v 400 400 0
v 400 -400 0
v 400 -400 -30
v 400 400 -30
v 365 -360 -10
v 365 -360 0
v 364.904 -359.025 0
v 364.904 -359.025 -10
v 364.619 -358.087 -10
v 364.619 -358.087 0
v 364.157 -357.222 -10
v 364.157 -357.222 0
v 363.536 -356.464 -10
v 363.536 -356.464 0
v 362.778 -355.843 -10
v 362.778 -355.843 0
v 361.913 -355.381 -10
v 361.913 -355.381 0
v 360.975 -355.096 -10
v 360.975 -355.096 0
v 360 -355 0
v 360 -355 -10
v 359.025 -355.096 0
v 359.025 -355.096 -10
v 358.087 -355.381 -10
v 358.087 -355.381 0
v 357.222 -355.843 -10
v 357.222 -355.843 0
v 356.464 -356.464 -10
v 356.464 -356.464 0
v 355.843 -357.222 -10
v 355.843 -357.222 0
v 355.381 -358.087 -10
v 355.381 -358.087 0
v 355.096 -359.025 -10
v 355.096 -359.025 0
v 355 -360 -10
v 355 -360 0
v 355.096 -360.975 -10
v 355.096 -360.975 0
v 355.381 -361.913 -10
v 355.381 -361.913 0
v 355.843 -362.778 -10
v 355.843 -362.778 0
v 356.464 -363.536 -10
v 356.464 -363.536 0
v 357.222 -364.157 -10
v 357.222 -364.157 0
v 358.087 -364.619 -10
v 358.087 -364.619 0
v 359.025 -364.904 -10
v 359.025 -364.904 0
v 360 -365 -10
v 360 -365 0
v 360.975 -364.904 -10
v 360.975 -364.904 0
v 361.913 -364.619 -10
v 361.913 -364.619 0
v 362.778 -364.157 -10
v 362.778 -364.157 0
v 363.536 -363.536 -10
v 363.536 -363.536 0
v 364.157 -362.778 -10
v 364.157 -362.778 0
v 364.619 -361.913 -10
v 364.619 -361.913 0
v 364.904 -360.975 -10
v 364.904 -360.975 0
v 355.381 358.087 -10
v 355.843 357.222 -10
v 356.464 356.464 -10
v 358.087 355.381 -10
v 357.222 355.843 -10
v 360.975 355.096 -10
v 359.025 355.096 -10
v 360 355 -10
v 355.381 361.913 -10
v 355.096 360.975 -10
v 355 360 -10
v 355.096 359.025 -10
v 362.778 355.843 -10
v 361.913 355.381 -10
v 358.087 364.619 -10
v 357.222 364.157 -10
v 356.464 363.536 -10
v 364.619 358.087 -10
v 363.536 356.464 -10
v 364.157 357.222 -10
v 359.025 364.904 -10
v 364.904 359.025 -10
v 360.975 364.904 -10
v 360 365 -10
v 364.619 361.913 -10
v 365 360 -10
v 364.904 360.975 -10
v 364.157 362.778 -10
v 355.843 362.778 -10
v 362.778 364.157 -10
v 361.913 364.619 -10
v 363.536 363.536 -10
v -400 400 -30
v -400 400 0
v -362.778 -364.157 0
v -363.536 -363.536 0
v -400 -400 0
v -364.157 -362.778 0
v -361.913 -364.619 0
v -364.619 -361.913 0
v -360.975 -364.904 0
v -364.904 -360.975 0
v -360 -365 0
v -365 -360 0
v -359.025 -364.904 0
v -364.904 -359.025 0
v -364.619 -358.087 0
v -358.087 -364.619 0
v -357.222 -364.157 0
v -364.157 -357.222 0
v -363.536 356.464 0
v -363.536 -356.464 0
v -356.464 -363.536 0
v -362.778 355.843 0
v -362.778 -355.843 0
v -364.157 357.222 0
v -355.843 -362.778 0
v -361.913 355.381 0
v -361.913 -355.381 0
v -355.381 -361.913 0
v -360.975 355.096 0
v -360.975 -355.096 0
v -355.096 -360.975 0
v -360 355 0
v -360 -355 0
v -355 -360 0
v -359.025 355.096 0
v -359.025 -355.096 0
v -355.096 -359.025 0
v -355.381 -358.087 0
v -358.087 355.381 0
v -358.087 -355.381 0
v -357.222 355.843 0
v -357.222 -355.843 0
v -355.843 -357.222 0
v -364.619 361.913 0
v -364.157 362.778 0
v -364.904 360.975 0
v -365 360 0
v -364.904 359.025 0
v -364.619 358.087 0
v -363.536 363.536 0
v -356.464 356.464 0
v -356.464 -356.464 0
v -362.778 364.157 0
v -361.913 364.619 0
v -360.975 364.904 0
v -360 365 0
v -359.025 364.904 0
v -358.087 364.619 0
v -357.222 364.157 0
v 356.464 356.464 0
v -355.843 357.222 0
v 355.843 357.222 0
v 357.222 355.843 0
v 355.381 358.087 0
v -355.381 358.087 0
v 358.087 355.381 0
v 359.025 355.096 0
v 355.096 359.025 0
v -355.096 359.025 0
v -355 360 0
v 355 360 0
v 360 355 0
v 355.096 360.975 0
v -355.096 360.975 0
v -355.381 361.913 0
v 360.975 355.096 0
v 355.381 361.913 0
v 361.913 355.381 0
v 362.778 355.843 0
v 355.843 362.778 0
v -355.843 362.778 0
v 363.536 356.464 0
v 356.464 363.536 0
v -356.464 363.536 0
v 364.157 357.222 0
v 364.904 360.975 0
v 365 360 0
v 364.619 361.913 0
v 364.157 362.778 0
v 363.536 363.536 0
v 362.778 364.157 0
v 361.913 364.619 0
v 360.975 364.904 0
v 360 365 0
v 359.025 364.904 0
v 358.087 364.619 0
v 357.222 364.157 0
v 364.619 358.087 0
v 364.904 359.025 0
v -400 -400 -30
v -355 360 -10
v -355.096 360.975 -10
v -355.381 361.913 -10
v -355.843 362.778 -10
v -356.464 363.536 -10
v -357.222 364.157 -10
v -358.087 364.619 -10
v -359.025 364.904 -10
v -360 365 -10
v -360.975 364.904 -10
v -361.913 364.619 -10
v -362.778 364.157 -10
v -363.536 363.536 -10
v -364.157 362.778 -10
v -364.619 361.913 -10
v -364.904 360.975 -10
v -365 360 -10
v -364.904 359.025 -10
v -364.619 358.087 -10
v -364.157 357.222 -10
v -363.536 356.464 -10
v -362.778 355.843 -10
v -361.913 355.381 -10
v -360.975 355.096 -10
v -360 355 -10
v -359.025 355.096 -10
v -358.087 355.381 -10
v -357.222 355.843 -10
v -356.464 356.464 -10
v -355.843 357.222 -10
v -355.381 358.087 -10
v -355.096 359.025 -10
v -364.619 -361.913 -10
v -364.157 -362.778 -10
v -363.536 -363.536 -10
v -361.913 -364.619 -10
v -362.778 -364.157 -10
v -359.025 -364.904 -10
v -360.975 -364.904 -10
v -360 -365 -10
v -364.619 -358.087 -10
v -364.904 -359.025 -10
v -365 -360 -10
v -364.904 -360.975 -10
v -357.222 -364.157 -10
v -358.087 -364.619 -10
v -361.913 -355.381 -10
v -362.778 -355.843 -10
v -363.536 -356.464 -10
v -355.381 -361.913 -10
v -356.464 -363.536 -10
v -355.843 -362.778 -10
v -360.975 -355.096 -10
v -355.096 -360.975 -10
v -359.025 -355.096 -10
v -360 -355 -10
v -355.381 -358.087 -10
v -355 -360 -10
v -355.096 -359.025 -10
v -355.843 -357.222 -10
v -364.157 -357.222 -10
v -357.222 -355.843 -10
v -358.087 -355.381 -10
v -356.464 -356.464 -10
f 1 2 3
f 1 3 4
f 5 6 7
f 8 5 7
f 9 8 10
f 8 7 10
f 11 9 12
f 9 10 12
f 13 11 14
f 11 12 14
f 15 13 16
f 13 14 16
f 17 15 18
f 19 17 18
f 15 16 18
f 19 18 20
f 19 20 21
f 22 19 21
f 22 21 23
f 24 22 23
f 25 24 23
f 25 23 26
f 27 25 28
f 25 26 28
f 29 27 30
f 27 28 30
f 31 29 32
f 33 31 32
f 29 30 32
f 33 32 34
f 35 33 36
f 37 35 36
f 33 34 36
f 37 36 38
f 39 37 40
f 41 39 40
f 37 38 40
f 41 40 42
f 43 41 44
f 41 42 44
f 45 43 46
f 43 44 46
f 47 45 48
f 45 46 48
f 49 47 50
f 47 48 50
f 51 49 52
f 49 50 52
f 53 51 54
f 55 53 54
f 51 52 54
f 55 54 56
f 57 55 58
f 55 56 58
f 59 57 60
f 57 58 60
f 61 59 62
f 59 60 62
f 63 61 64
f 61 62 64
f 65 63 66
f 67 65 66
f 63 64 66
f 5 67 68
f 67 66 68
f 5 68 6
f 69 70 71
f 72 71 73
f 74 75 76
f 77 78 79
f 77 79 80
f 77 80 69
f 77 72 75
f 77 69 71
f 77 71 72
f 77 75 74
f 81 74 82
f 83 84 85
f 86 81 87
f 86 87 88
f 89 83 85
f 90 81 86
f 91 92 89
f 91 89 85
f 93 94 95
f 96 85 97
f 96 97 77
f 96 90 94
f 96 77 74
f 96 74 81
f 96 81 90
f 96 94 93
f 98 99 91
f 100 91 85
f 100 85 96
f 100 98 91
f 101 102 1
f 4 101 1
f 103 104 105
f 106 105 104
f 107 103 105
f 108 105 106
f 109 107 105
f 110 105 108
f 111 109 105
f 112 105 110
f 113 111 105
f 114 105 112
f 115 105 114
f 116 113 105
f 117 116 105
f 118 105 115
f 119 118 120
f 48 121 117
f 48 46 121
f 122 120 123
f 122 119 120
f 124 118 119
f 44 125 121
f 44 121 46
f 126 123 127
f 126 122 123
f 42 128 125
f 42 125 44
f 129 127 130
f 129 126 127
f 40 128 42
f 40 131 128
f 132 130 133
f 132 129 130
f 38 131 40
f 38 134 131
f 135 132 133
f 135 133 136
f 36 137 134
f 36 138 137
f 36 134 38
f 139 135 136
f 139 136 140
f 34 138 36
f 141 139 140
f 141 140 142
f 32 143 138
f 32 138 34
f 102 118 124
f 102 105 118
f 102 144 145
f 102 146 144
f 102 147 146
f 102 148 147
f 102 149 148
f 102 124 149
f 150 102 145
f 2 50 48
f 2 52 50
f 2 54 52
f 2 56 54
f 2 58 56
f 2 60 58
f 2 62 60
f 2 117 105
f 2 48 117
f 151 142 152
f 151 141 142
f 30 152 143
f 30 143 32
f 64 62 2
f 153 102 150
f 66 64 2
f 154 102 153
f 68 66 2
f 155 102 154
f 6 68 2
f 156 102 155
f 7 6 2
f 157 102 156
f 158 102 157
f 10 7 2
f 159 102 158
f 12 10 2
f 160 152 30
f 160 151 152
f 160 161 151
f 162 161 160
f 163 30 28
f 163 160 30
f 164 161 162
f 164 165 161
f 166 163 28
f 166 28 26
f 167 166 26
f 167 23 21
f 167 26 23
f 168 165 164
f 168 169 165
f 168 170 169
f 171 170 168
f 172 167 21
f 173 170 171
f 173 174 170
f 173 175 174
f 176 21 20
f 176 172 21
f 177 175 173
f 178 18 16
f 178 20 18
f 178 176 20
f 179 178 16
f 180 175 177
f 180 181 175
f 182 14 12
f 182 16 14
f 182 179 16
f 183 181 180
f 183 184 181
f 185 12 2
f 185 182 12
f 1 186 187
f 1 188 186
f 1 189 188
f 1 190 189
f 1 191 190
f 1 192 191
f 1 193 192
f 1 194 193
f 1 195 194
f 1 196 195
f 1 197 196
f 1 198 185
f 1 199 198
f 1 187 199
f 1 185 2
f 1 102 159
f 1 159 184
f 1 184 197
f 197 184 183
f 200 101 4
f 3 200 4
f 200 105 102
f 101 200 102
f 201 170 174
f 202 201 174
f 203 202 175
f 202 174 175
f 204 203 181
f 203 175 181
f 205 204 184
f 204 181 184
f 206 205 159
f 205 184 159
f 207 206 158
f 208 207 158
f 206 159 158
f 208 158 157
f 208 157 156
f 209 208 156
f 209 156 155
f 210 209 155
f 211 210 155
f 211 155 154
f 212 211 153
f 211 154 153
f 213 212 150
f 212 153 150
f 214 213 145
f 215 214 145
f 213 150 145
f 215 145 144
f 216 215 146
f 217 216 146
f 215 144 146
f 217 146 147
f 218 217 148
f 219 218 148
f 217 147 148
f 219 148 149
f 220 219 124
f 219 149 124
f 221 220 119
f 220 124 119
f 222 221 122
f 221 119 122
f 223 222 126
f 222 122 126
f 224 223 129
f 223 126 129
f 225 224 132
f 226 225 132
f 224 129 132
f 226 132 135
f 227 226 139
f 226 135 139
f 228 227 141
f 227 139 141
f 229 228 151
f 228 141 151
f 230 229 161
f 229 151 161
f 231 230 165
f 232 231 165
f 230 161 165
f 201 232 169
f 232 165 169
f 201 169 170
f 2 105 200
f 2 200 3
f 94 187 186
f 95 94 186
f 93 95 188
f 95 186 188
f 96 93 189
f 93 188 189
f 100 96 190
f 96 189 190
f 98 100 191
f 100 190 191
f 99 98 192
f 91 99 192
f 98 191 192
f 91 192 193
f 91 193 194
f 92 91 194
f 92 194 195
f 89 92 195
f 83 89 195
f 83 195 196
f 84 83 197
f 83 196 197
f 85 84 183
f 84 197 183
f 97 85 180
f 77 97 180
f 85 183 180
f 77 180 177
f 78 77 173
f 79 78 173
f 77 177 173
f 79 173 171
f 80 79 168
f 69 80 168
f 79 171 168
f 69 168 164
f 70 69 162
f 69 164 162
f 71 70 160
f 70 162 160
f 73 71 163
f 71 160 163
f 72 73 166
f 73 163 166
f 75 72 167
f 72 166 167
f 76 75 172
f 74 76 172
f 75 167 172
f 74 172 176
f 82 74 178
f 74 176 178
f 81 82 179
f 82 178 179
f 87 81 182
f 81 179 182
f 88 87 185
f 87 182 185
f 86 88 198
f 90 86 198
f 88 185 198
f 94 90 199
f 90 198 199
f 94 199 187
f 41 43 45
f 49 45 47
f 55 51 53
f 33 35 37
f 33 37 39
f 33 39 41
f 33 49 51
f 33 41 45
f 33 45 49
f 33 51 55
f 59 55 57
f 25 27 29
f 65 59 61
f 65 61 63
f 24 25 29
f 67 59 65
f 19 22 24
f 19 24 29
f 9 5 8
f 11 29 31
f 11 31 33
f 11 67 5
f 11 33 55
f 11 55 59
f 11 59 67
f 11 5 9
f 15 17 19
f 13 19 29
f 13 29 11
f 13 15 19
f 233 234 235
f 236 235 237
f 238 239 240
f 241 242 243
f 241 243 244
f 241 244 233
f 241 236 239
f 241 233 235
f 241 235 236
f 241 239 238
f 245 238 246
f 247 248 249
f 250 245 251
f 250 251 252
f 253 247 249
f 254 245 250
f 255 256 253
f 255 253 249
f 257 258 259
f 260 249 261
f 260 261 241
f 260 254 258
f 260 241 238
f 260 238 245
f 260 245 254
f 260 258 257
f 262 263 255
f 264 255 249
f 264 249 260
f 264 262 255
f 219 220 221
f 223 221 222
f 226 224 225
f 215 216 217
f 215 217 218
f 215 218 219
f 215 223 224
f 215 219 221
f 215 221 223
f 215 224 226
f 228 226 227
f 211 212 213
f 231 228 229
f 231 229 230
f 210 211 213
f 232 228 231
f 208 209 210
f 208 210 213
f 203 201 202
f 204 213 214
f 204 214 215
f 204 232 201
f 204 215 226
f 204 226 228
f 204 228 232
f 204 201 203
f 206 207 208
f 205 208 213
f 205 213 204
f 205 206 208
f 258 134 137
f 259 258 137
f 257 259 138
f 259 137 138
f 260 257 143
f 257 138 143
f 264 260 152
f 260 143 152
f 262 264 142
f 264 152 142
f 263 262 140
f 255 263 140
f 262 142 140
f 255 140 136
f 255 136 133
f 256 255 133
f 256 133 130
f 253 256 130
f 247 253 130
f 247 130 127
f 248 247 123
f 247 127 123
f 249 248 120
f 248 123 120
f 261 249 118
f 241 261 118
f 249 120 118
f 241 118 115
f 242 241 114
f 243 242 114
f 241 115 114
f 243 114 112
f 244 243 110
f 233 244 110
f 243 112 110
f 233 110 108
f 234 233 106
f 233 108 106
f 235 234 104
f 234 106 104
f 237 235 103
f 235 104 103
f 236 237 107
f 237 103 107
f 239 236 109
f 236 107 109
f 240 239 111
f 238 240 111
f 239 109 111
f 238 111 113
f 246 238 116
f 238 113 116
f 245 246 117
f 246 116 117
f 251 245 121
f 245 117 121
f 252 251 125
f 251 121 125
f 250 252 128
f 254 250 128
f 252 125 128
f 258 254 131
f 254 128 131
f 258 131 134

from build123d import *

# Parameters (mm, degrees)
SKETCH1_W           = 800
SKETCH1_H           = 800
BOSS_EXTRUDE1_DEPTH = 30
SKETCH2_R           = 5
CUT_EXTRUDE1_DEPTH  = 10
SKETCH4_R           = 5
CUT_EXTRUDE2_DEPTH  = 10
SKETCH6_R           = 5
CUT_EXTRUDE3_DEPTH  = 10
SKETCH8_R           = 5
CUT_EXTRUDE4_DEPTH  = 10


with BuildPart() as part:
    # Sketch1 → Boss-Extrude1 (new body)
    with BuildSketch(Plane.XY):
        Rectangle(SKETCH1_W, SKETCH1_H)
    extrude(amount=-BOSS_EXTRUDE1_DEPTH)

    # Sketch2 → Cut-Extrude1 (cut)
    with BuildSketch(Plane.XY):
        with Locations((360, 360)):
            Circle(SKETCH2_R)
    extrude(amount=-CUT_EXTRUDE1_DEPTH, mode=Mode.SUBTRACT)

    # Sketch4 → Cut-Extrude2 (cut)
    with BuildSketch(Plane.XY):
        with Locations((-360, 360)):
            Circle(SKETCH4_R)
    extrude(amount=-CUT_EXTRUDE2_DEPTH, mode=Mode.SUBTRACT)

    # Sketch6 → Cut-Extrude3 (cut)
    with BuildSketch(Plane.XY):
        with Locations((-360, -360)):
            Circle(SKETCH6_R)
    extrude(amount=-CUT_EXTRUDE3_DEPTH, mode=Mode.SUBTRACT)

    # Sketch8 → Cut-Extrude4 (cut)
    with BuildSketch(Plane.XY):
        with Locations((360, -360)):
            Circle(SKETCH8_R)
    extrude(amount=-CUT_EXTRUDE4_DEPTH, mode=Mode.SUBTRACT)


solid = part.part
